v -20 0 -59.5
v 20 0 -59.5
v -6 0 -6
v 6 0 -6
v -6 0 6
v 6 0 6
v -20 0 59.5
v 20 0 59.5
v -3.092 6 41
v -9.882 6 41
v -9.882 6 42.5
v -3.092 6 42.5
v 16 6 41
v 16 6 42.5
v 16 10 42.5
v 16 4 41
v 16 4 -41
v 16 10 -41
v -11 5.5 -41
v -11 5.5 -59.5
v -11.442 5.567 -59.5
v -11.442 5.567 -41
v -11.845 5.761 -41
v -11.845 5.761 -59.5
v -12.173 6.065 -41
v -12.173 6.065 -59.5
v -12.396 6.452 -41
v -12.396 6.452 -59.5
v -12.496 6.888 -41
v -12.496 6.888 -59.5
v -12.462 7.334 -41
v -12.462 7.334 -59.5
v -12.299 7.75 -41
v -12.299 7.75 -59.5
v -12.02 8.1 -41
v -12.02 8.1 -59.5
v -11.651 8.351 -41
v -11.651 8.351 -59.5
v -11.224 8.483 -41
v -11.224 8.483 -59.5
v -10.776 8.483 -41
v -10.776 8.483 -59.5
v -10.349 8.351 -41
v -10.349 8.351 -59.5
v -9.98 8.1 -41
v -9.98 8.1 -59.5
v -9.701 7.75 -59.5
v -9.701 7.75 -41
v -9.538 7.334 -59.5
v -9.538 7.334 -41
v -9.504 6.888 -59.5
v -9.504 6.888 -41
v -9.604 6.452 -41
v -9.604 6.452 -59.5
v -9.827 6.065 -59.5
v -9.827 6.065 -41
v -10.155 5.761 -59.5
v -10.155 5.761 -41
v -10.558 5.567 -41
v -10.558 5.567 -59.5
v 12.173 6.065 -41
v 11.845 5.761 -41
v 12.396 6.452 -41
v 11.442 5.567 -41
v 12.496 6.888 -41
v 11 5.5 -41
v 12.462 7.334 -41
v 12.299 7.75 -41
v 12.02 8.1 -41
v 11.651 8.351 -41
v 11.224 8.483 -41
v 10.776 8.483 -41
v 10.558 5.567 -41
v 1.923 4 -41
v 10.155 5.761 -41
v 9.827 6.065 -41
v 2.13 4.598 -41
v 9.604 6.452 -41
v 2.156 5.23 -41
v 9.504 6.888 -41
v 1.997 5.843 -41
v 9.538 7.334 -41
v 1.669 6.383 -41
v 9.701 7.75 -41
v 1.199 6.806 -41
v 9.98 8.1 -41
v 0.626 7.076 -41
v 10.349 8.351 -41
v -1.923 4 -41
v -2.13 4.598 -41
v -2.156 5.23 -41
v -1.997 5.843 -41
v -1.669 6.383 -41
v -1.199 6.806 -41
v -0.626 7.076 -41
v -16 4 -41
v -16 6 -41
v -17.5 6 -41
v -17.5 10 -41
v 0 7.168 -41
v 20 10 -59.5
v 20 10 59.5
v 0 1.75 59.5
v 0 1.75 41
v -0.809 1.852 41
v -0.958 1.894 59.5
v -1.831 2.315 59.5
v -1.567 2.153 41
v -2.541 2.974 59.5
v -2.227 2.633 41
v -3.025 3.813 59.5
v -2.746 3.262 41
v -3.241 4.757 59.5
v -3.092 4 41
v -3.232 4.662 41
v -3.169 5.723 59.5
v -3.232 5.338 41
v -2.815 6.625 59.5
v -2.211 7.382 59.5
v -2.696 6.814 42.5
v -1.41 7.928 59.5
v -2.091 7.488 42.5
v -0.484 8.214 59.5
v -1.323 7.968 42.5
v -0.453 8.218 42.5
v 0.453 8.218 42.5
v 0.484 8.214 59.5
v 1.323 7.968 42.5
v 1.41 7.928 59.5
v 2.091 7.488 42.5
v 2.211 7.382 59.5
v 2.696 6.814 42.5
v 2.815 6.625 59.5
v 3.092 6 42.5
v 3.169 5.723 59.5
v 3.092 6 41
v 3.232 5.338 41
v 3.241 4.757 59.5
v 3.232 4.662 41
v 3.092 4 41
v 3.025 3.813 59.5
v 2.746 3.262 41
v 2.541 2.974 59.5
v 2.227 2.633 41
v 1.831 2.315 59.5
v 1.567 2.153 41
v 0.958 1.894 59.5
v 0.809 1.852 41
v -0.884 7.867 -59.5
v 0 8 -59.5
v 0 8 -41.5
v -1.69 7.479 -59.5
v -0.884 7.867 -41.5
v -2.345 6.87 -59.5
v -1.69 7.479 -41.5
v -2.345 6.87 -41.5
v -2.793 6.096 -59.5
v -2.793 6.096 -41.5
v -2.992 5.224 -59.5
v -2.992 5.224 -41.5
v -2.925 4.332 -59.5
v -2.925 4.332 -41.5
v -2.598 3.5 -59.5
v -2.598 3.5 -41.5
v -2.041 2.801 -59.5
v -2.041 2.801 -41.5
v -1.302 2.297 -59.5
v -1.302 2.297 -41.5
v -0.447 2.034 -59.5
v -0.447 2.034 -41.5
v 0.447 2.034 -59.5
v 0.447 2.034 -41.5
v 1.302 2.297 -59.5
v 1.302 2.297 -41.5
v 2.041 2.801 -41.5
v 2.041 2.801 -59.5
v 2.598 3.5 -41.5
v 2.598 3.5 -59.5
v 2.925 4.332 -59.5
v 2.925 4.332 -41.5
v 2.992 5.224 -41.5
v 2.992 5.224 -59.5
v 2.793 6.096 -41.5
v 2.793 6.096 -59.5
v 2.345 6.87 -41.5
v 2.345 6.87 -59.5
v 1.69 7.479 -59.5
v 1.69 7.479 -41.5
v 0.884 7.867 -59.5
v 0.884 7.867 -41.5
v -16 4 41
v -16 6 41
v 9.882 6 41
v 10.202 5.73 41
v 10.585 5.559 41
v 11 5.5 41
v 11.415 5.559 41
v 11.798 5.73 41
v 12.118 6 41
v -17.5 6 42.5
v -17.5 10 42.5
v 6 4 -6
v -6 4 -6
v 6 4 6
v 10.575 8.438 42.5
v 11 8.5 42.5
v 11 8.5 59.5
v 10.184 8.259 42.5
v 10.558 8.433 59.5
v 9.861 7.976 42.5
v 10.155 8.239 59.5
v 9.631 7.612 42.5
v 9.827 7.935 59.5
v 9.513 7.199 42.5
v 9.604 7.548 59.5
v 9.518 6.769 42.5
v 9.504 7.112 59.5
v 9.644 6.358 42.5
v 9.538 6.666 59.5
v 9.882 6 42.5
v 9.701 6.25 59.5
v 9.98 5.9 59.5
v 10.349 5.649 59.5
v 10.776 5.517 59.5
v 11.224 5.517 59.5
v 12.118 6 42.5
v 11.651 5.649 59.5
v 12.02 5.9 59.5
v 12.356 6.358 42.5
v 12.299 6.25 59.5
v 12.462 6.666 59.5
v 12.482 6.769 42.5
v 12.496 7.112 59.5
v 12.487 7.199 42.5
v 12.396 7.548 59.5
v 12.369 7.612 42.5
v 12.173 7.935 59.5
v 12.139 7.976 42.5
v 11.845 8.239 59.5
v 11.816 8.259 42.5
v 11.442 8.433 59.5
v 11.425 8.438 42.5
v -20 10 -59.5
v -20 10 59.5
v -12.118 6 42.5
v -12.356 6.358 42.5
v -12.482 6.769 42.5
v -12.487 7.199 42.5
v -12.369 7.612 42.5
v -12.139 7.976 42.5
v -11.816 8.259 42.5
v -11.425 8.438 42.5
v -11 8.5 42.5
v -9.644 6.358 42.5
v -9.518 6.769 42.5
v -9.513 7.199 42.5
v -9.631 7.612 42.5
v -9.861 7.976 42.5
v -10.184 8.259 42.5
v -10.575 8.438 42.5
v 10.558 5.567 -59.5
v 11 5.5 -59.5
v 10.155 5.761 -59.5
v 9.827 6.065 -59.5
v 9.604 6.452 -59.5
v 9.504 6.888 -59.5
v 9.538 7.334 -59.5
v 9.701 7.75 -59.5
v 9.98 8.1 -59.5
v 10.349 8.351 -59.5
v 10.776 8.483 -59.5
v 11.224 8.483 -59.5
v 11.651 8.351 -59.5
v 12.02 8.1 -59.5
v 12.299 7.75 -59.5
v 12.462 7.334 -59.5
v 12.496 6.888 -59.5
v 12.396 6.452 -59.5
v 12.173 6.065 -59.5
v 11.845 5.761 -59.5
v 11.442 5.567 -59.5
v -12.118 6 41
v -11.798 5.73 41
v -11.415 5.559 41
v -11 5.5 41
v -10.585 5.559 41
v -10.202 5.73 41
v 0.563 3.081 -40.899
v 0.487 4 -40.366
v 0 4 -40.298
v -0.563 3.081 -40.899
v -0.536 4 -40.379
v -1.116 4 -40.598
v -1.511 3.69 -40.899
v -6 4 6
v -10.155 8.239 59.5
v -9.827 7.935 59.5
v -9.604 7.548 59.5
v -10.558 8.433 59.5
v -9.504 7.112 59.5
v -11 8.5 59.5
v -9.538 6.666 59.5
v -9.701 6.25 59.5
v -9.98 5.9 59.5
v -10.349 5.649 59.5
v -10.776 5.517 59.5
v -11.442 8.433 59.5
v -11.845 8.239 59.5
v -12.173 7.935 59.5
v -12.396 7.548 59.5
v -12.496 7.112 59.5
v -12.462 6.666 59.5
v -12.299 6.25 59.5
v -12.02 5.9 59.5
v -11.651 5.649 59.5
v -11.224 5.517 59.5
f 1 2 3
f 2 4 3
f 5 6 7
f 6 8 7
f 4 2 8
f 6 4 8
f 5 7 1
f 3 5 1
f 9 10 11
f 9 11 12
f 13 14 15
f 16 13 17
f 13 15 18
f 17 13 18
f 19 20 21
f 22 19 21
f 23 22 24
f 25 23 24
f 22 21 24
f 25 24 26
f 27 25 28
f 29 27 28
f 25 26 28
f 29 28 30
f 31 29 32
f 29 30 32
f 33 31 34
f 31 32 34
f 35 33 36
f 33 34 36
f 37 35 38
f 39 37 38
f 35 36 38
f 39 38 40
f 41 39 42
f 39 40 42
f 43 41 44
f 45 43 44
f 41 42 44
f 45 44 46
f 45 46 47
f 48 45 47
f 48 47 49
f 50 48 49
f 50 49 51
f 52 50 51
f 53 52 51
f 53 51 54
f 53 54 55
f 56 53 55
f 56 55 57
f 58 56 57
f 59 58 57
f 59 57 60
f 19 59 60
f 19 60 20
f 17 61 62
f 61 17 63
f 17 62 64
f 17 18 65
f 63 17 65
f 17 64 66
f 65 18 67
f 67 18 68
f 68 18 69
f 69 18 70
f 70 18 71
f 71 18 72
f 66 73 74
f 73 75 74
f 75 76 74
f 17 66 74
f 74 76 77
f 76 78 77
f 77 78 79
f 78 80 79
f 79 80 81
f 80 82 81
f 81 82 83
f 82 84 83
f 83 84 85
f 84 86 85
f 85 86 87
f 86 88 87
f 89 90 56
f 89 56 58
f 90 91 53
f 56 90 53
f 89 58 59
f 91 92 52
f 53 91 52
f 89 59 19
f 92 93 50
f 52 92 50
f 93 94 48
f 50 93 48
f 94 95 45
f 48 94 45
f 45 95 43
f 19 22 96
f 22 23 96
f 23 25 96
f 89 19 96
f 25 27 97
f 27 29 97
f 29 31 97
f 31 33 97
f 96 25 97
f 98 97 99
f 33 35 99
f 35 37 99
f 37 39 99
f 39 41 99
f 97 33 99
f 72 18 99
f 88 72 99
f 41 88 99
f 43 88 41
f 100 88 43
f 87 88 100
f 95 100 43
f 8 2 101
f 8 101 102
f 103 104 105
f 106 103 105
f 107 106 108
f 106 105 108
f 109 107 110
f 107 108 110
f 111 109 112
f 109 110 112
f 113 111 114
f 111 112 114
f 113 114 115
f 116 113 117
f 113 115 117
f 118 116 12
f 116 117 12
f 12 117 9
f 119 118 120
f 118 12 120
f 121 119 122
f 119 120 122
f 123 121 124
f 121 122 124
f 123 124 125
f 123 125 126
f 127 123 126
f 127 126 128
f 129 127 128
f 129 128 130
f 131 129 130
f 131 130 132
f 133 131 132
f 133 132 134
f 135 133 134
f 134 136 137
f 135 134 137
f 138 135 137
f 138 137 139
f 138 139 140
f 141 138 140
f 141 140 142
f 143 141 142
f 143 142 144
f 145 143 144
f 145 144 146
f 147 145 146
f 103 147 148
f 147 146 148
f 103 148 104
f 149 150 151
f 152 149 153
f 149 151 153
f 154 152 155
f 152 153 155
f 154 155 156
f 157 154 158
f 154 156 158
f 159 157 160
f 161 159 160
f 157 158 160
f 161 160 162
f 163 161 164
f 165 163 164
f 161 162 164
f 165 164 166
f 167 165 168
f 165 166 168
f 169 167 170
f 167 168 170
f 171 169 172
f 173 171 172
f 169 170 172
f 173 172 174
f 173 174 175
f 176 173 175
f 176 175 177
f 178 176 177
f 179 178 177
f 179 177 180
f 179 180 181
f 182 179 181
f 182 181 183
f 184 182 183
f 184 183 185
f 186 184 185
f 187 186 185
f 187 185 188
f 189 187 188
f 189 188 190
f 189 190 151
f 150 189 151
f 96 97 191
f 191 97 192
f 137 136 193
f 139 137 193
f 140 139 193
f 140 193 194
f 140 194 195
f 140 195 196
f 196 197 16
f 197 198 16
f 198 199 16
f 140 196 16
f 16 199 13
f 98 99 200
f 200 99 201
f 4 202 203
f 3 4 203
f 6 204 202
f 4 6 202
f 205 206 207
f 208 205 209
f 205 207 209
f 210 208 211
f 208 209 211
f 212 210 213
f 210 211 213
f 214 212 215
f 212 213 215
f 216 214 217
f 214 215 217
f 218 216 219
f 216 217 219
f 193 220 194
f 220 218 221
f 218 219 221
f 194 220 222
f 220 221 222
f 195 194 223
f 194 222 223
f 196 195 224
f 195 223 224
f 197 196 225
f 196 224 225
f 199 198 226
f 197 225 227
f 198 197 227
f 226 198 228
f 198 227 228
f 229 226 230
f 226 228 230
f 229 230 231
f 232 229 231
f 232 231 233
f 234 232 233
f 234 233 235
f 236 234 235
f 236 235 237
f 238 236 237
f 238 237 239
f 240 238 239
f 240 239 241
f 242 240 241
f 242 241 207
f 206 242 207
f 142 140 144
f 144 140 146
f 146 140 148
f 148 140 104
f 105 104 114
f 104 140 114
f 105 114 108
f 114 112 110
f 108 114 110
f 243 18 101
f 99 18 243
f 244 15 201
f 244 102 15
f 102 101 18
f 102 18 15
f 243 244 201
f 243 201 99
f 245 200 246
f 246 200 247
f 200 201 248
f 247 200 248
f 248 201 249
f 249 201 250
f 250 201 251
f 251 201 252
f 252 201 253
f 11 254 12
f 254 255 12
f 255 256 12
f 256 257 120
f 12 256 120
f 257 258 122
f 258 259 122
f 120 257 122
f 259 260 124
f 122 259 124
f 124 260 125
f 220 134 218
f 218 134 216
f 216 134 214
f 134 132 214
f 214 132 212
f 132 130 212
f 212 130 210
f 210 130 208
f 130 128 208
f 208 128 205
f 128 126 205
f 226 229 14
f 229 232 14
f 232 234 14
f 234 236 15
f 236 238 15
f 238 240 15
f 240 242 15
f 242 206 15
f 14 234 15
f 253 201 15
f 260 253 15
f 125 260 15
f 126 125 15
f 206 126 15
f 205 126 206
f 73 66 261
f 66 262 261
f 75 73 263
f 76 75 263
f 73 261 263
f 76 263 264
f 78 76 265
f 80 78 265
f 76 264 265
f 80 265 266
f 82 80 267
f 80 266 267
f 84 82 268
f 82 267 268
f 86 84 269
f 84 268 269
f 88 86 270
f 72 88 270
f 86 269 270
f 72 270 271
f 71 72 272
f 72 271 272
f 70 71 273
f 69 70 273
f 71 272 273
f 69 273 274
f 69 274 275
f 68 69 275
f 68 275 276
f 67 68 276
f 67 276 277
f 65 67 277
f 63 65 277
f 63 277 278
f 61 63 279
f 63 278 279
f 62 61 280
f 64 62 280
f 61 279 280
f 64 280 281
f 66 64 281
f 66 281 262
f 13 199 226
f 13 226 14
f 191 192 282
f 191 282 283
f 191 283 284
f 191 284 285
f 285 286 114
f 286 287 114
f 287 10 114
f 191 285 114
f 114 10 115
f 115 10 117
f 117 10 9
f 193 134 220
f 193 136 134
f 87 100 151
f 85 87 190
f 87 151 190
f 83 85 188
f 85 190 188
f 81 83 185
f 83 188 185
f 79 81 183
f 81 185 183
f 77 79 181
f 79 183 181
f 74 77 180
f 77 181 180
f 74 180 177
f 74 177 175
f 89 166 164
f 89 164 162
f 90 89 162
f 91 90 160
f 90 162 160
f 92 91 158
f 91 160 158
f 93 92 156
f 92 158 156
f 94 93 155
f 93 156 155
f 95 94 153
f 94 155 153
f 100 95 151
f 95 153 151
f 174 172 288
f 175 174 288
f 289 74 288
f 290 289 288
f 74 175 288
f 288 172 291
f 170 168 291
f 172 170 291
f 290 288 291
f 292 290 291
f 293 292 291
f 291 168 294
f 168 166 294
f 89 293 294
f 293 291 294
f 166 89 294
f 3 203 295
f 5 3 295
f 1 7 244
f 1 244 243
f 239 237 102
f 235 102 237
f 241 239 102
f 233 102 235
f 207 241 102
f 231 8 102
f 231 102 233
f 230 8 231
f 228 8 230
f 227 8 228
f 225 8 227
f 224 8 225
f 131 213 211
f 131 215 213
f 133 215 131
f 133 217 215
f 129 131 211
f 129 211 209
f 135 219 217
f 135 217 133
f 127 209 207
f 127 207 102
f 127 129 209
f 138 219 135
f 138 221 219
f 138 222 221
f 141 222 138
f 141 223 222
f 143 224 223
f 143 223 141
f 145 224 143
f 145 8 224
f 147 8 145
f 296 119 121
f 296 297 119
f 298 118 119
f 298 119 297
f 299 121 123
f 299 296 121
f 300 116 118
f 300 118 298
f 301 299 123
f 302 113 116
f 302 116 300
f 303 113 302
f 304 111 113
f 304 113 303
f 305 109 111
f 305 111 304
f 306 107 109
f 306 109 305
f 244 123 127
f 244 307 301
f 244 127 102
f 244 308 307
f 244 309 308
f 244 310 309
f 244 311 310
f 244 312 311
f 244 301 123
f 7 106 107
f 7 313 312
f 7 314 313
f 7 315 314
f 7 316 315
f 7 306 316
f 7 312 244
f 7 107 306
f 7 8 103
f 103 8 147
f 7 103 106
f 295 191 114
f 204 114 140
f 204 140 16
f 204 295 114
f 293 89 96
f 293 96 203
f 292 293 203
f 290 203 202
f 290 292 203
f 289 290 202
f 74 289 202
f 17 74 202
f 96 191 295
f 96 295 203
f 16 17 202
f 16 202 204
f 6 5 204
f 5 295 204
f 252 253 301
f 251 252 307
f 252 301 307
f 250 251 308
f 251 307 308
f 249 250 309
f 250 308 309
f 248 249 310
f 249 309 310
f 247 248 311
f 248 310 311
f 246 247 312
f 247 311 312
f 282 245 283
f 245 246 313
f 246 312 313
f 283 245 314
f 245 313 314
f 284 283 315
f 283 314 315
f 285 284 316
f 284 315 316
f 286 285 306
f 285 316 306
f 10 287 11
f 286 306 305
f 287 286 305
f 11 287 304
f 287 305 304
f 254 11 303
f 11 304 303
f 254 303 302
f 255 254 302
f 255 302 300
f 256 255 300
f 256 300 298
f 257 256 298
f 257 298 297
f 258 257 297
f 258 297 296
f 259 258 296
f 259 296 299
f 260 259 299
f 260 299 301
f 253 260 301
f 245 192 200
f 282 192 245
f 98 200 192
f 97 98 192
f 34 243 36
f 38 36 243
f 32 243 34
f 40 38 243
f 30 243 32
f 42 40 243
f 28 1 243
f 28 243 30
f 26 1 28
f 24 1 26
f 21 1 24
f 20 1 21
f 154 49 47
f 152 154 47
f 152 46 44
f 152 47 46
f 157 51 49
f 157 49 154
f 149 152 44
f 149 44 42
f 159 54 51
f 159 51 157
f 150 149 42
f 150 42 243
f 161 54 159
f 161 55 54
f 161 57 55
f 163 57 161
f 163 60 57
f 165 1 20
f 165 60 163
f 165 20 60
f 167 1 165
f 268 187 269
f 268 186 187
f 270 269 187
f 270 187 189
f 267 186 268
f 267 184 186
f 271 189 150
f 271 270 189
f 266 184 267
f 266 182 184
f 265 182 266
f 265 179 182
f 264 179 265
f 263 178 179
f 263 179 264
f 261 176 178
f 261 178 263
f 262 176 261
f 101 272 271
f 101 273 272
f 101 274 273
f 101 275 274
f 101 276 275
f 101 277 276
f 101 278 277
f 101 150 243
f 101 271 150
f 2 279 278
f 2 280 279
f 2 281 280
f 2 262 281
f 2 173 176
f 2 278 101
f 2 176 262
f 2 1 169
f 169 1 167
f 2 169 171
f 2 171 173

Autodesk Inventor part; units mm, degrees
sketch "Sketch1" plane through (0, 0, 0) normal (0, 1, 0) x (-1, 0, 0)
  line L0 (-20, 59.5) -> (20, 59.5)
  line L1 (20, 59.5) -> (20, -59.5)
  line L2 (20, -59.5) -> (-20, -59.5)
  line L3 (-20, -59.5) -> (-20, 59.5)
  line L4 (-20, 59.5) -> (20, -59.5) construction
  line L5 (20, 59.5) -> (-20, -59.5) construction
  point P0 (0, 0)
  dimension "d0" = 40
  dimension "d1" = 119
extrude "Extrusion1" add sketch "Sketch1" along normal blind 10
sketch "Sketch2" plane through (0, 10, 0) normal (0, 1, 0) x (1, 0, 0)
  line L0 (-16, -41) -> (-6, -41)
  line L1 (-6, -41) -> (-6, 41)
  line L2 (-6, 41) -> (-16, 41)
  line L3 (-16, 41) -> (-16, -41)
  line L4 (-16, -41) -> (-6, 41) construction
  line L5 (-6, -41) -> (-16, 41) construction
  line L6 (16, -41) -> (6, -41)
  line L7 (6, -41) -> (6, 41)
  line L8 (6, 41) -> (16, 41)
  line L9 (16, 41) -> (16, -41)
  line L10 (16, -41) -> (6, 41) construction
  line L11 (6, -41) -> (16, 41) construction
  line L12 (-6, -41) -> (6, -41)
  line L13 (6, -41) -> (6, 41)
  line L14 (6, 41) -> (-6, 41)
  line L15 (-6, 41) -> (-6, -41)
  line L16 (-6, -41) -> (6, 41) construction
  line L17 (6, -41) -> (-6, 41) construction
  point P0 (0, 0)
  point P1 (-11, 0)
  point P2 (11, 0)
  dimension "d4" = 10
  dimension "d5" = 82
  dimension "d6" = 11
  dimension "d7" = 0
  dimension "d8" = 10
  dimension "d9" = 82
  dimension "d10" = 11
  dimension "d21" = 12
  dimension "d22" = 82
extrude "Extrusion3" cut sketch "Sketch2" against normal blind 6
sketch "Sketch3" plane through (0, 4, 0) normal (0, 1, 0) x (1, 0, 0)
  line L0 (-6, -6) -> (6, -6)
  line L1 (6, -6) -> (6, 6)
  line L2 (6, 6) -> (-6, 6)
  line L3 (-6, 6) -> (-6, -6)
  line L4 (-6, -6) -> (6, 6) construction
  line L5 (6, -6) -> (-6, 6) construction
  point P0 (0, 0)
  dimension "d35" = 12
  dimension "d36" = 12
extrude "Extrusion4" cut sketch "Sketch3" against normal blind 6
ref_plane "Work Plane1" through (0, 4.5, 0) normal (0, 1, 0) x (-1, 0, 0)
ref_plane "Work Plane2" through (11, 0, 0) normal (1, 0, 0) x (0, 1, 0)
ref_plane "Work Plane3" through (-11, 0, 0) normal (1, 0, 0) x (0, 1, 0)
ref_plane "Work Plane7" through (-6, 4, -41) normal (0, 0, 1) x (1, 0, 0)
sketch "Sketch6" plane through (-6, 4, -41) normal (0, 0, 1) x (1, 0, 0)
  circle A0 centre (-5, 3) radius 1.5
  line L0 (0, 6) -> (0, 0) projected
  line L1 (-10, 6) -> (22, 6) projected
  line L2 (-10, 6) -> (-10, 0) projected
  point P0 (6, -4)
  point P1 (-9, 6)
  dimension "d42" = 3
  dimension "d44" = 3
  dimension "d112" = 5
ref_plane "Work Plane4" through (7, 4, -40) normal (0, 0, 1) x (1, 0, 0)
sketch "Sketch7" plane through (7, 4, -40) normal (0, 0, 1) x (1, 0, 0)
  circle A0 centre (4, 3) radius 1.5
  line L0 (0, 6) -> (8, 6) projected
  line L1 (9, 0) -> (9, 6) projected
  point P0 (-7, -4)
  dimension "d45" = 3
  dimension "d46" = 3
  dimension "d47" = 5
hole "Hole1" at (-11, 7, -41) direction (0, 0, -1) diameter 3 end through all
hole "Hole2" at (11, 7, -40) direction (0, 0, -1) diameter 3 end through all
ref_plane "Work Plane6" through (-6, 4, 41) normal (0, 0, -1) x (-1, 0, 0)
sketch "Sketch8" plane through (-6, 4, 41) normal (0, 0, -1) x (-1, 0, 0)
  circle A0 centre (5, 3) radius 1.5
  line L0 (-22, 6) -> (10, 6) projected
  line L1 (10, 0) -> (10, 6) projected
  point P0 (-6, -4)
  point P1 (0, 6)
  point P2 (9, 6)
  dimension "d62" = 3
  dimension "d63" = 3
  dimension "d64" = 5
ref_plane "Work Plane5" through (7, 4, 40) normal (0, 0, -1) x (-1, 0, 0)
sketch "Sketch9" plane through (7, 4, 40) normal (0, 0, -1) x (-1, 0, 0)
  circle A0 centre (-4, 3) radius 1.5
  line L0 (-8, 6) -> (0, 6) projected
  line L1 (-9, 6) -> (-9, 0) projected
  point P0 (7, -4)
  dimension "d65" = 3
  dimension "d66" = 3
  dimension "d67" = 5
hole "Hole3" at (-11, 7, 41) direction (0, 0, 1) diameter 3 end through all
hole "Hole4" at (11, 7, 40) direction (0, 0, 1) diameter 3 end through all
sketch "Sketch10" plane through (-20, 0, 59.5) normal (0, 0, 1) x (1, 0, 0)
  circle A0 centre (20, 5) radius 3.25
  line L0 (40, 0) -> (40, 10) projected
  point P0 (20, 0)
  dimension "d92" = 6.5
  dimension "d93" = 5
  dimension "d94" = 20
hole "Hole5" at (0, 5, 59.5) direction (0, 0, -1) diameter 6.5 depth 18.5
sketch "Sketch11" plane through (20, 0, -59.5) normal (0, 0, -1) x (-1, 0, 0)
  circle A0 centre (20, 5) radius 3.25
  line L0 (40, 0) -> (0, 0) projected
  line L1 (40, 0) -> (40, 10) projected
  point P0 (20, 0)
  dimension "d102" = 6.5
  dimension "d103" = 5
  dimension "d104" = 20
hole "Hole6" at (0, 5, -59.5) direction (0, 0, 1) diameter 6 depth 18 tip angle 118
sketch "Sketch12" plane through (0, 10, 0) normal (0, 1, 0) x (1, 0, 0)
  line L0 (-17.5, -41) -> (-16, -41)
  line L1 (-16, -41) -> (-16, 41)
  line L2 (-16, 41) -> (-17.5, 41)
  line L3 (-17.5, 41) -> (-17.5, -41)
  line L4 (-17.5, -41) -> (-16, 41) construction
  line L5 (-16, -41) -> (-17.5, 41) construction
  line L6 (-17.5, -42.5) -> (16, -42.5)
  line L7 (16, -42.5) -> (16, -41)
  line L8 (16, -41) -> (-17.5, -41)
  line L9 (-17.5, -41) -> (-17.5, -42.5)
  line L10 (-17.5, -42.5) -> (16, -41) construction
  line L11 (16, -42.5) -> (-17.5, -41) construction
  point P0 (0, 0)
  point P1 (-16.75, 0)
  point P2 (-0.75, -41.75)
  dimension "d113" = 1.5
  dimension "d114" = 82
  dimension "d115" = 16
  dimension "d116" = 33.5
  dimension "d117" = 1.5
  dimension "d118" = 0
  dimension "d128" = 0.75
extrude "Extrusion7" cut sketch "Sketch12" against normal blind 4
thread "Thread5" size "M3x0.5" class "6H" standard "ANSI Metric M Profile" full length
thread "Thread6" size "M3x0.5" class "6H" standard "ANSI Metric M Profile" full length
properties part number "BottomSupportPlate"
